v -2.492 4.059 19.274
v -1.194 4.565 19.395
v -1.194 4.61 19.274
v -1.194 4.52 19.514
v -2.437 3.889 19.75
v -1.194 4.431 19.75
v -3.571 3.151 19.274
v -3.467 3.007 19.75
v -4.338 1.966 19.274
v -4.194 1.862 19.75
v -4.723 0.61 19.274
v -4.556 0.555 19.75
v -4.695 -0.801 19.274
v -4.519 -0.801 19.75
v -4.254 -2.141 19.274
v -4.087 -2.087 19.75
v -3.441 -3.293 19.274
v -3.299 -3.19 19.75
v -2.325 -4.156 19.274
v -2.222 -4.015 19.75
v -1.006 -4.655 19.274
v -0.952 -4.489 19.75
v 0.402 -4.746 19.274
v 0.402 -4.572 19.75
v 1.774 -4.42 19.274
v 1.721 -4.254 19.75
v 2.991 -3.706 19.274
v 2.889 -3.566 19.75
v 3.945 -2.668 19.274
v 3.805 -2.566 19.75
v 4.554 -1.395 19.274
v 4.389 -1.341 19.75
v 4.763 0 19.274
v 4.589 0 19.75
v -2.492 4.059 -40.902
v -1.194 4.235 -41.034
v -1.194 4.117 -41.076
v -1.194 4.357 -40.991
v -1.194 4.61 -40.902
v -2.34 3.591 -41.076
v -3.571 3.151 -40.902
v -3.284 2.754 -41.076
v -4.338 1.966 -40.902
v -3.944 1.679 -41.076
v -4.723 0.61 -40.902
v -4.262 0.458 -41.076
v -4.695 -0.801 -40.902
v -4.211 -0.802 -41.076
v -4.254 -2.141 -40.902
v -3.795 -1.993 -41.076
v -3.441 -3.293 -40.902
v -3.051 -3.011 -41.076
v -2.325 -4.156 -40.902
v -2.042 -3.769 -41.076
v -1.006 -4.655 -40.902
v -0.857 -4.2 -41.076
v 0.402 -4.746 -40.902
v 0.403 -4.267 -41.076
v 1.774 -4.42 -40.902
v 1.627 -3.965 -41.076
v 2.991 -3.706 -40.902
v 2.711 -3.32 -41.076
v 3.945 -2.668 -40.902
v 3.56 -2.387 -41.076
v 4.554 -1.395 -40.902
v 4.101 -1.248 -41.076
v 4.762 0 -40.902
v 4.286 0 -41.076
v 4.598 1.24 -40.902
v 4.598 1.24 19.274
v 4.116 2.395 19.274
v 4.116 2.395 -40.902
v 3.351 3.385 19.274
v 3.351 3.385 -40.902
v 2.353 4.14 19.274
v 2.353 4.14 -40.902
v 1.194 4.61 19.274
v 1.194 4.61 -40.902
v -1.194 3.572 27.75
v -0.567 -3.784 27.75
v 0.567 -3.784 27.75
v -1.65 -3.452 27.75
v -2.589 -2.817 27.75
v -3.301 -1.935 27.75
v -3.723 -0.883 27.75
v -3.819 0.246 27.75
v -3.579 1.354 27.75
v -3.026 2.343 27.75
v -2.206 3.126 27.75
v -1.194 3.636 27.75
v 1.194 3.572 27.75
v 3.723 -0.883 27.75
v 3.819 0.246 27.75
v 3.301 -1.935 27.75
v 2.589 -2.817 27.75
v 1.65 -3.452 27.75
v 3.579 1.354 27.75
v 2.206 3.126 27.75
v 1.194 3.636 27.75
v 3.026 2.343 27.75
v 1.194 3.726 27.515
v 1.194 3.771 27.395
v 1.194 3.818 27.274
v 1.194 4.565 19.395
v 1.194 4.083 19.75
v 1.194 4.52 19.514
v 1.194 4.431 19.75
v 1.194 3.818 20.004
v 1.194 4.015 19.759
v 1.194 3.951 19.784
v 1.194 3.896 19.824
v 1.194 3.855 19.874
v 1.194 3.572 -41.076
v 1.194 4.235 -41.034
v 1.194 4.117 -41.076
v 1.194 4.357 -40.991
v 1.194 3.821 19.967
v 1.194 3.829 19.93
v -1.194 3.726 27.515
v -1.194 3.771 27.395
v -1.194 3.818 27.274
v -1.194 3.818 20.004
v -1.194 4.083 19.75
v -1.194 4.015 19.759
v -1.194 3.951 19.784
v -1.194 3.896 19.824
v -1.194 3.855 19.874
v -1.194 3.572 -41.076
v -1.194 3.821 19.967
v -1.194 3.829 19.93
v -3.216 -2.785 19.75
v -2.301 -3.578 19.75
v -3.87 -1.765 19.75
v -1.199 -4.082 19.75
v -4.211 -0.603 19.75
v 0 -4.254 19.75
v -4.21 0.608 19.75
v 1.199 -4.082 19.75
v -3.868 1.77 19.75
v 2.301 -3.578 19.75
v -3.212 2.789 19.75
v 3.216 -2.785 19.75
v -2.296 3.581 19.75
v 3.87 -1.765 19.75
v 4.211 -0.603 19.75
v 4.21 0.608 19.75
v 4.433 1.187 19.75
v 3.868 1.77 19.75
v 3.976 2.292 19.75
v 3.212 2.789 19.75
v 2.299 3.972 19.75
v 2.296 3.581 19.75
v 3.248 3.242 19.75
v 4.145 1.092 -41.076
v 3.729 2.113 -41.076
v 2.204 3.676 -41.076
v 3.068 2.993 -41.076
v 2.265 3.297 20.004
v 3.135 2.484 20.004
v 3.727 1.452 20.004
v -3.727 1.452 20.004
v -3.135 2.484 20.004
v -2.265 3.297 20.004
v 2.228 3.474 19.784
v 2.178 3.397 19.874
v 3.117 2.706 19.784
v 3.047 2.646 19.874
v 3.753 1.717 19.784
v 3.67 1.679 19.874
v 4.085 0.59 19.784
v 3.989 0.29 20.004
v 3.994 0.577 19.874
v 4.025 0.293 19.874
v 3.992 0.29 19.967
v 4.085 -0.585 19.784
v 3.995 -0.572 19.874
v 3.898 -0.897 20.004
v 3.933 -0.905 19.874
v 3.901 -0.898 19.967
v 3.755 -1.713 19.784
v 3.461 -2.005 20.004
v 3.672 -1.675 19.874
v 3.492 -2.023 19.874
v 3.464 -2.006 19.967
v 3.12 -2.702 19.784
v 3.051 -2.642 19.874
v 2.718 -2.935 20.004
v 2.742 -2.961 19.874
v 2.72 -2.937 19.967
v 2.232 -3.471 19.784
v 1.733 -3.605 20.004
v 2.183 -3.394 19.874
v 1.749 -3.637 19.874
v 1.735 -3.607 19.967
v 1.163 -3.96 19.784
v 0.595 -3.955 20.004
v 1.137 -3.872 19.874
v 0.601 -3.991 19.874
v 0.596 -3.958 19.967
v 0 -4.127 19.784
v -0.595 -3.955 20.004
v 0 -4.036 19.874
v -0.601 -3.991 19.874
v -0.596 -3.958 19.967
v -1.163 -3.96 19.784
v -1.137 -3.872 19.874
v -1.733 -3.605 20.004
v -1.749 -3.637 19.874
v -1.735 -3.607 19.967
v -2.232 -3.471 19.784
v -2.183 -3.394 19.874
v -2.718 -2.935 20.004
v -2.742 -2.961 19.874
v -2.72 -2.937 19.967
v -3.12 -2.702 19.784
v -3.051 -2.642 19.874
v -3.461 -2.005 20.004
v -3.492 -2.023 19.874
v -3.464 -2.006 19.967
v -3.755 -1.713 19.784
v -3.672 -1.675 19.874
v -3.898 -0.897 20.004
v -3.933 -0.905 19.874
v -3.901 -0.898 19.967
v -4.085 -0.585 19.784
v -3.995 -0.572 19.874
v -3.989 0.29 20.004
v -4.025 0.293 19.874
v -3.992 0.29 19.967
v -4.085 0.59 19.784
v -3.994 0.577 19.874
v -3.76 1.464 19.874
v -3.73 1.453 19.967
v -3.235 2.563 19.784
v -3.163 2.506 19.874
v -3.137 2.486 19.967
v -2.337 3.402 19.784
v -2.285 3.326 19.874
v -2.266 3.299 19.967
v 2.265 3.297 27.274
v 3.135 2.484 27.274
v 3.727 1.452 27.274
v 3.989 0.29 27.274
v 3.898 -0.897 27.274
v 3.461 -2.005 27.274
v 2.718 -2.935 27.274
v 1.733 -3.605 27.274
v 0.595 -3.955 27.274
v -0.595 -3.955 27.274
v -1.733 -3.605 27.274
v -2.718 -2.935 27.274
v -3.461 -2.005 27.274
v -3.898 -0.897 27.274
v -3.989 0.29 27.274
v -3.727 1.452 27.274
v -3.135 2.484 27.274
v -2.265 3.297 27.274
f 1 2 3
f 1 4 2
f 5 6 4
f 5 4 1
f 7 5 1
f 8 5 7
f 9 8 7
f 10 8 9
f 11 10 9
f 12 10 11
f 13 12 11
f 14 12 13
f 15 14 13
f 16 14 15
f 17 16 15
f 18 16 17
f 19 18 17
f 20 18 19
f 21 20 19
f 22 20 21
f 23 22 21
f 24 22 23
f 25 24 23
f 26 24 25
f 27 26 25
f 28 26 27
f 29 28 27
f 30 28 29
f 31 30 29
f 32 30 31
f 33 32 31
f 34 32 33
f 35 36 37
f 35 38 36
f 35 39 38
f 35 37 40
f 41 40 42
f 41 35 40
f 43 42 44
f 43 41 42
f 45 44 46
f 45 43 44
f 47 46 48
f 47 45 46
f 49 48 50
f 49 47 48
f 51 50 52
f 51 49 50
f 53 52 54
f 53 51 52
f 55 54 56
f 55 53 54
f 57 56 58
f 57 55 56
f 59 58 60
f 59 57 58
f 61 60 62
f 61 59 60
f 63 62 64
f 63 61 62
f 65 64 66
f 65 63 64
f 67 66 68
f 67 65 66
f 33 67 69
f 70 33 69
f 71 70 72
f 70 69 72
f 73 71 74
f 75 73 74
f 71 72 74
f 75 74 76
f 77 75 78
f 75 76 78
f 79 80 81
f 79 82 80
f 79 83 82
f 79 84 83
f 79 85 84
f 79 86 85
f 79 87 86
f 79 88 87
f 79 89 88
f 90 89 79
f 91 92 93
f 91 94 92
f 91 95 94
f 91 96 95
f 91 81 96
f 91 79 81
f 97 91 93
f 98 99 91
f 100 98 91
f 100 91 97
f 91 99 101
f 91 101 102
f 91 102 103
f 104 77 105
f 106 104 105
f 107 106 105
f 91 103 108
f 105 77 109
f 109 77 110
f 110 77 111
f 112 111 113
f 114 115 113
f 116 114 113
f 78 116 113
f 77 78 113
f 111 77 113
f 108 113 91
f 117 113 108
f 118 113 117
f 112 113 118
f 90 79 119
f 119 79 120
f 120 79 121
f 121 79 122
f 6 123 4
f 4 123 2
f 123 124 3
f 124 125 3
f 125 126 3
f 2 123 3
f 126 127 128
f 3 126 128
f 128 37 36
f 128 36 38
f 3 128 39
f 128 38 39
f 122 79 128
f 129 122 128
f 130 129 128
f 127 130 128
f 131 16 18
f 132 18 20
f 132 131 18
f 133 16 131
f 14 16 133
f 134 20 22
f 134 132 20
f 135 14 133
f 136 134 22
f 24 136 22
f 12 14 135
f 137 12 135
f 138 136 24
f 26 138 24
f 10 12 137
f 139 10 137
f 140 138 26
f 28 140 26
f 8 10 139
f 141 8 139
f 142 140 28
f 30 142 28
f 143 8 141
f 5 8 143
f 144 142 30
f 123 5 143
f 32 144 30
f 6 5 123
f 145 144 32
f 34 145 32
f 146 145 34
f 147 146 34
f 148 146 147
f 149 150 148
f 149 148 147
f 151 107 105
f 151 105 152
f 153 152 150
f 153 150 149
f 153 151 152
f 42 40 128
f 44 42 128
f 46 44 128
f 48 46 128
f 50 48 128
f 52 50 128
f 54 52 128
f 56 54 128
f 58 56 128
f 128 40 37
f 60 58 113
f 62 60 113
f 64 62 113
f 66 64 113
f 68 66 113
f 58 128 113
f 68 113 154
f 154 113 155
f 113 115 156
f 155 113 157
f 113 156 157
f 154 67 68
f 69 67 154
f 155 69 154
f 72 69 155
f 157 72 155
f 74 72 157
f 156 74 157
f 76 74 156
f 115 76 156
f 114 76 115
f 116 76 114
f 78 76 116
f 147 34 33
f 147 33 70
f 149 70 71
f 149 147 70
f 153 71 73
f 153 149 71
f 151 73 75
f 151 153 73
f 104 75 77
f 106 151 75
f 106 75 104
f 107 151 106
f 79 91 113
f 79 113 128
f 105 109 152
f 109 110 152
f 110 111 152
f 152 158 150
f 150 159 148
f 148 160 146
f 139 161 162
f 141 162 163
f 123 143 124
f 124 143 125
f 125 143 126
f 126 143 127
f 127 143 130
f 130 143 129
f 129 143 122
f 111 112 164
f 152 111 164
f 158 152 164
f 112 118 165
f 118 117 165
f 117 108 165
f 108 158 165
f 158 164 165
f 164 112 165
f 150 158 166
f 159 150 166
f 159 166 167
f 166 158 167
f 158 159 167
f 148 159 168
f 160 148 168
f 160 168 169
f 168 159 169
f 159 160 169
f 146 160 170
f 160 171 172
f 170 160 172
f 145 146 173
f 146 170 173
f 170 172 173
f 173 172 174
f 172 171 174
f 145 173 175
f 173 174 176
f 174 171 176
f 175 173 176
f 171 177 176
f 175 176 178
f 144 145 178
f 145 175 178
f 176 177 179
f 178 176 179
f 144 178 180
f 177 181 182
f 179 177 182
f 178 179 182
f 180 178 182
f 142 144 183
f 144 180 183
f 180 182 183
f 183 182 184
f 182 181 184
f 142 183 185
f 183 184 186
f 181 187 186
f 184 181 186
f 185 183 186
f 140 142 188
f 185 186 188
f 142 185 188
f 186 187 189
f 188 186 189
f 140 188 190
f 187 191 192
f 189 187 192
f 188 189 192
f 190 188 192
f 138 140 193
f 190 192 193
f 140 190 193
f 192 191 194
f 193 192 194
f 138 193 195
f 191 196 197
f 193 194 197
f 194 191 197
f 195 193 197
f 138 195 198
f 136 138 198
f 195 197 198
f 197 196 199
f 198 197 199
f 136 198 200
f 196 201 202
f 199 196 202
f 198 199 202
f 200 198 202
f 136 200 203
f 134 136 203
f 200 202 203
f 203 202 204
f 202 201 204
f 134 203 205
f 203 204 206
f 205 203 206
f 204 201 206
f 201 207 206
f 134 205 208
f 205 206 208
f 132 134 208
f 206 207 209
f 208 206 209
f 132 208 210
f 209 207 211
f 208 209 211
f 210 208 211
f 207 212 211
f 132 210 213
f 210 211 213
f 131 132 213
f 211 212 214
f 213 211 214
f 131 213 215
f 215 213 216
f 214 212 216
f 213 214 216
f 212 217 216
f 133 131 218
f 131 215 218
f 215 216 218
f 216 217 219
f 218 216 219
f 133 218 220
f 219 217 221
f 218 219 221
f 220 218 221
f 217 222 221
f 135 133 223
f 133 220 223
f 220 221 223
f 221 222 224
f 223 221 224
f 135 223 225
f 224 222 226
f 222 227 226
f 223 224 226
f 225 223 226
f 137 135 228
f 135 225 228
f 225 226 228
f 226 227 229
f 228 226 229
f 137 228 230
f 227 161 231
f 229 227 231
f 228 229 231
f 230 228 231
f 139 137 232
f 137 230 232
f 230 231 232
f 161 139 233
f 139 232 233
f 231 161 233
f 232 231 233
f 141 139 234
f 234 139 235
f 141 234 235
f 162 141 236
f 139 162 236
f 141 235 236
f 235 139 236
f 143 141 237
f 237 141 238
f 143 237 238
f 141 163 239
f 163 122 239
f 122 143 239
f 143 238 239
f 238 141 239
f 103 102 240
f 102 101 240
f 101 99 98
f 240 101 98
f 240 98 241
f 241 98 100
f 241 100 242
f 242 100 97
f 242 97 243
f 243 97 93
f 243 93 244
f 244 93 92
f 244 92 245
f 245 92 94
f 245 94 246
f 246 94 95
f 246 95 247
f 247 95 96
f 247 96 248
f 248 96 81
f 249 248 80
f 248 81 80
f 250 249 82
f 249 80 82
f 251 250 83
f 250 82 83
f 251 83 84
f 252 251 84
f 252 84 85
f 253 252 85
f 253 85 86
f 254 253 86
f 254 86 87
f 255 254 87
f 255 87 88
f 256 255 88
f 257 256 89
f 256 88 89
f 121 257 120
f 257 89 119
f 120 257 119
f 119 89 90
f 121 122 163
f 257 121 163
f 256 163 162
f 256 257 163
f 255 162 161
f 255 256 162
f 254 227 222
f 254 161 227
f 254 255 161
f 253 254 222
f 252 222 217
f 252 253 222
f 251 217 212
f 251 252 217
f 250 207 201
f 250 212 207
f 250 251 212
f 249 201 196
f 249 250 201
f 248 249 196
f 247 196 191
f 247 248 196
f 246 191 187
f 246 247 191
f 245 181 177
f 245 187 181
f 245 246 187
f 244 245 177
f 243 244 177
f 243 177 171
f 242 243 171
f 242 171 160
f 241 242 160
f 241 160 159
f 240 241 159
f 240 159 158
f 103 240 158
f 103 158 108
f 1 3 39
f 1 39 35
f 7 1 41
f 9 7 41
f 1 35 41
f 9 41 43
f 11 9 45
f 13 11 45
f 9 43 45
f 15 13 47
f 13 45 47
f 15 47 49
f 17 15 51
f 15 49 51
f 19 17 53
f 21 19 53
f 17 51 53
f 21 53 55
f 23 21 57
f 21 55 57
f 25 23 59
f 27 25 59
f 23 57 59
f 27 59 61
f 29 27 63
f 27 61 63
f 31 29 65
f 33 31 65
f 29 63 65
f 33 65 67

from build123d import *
from OCP.BRepFilletAPI import BRepFilletAPI_MakeChamfer

# Parameters (mm, degrees)
BOSS_EXTRUDE1_DEPTH      = 27.750000126
BOSS_EXTRUDE1_DEPTH_BACK = 41.075600094
SKETCH5_R                = 4.7625
SKETCH5_R_2              = 4
CUT_EXTRUDE1_DEPTH       = 8
CHAMFER1_SIZE            = 0.47625
CHAMFER1_SIZE2           = 0.173340824
FILLET1_R                = 0.254


with BuildPart() as part:
    # Sketch3 → Boss-Extrude1 (new, two sides: drawn at the far end of the back side and taken through both)
    with BuildSketch(Plane.XY.offset(-BOSS_EXTRUDE1_DEPTH_BACK)):
        with BuildLine():
            Line((-1.1938, 3.571875), (-1.1938, 4.610449849))
            ThreePointArc((-1.1938, 4.610449849), (-2.915127249, -3.766090728), (4.7625, 0))
            ThreePointArc((4.7625, 0), (3.766090728, 2.915127249), (1.1938, 4.610449849))
            Line((1.1938, 4.610449849), (1.1938, 3.571875))
            Line((1.1938, 3.571875), (-1.1938, 3.571875))
        make_face()
    extrude(amount=BOSS_EXTRUDE1_DEPTH + BOSS_EXTRUDE1_DEPTH_BACK)

    # Sketch5 → Cut-Extrude1 (cut)
    with BuildSketch(Plane.XY.offset(27.750000126)):
        Circle(SKETCH5_R)
        Circle(SKETCH5_R_2, mode=Mode.SUBTRACT)
    extrude(amount=-CUT_EXTRUDE1_DEPTH, mode=Mode.SUBTRACT)

    # Chamfer1: one chamfer whose edges measure the first distance from different faces: ONE call of the kernel's chamfer builder (chamfer() names one face for all edges)
    chamfer1_edges_1 = [part.edges().sort_by_distance(p)[0] for p in [
        (0, -4, 27.750000126),
    ]]
    chamfer1_side_1 = [part.faces().sort_by_distance(p)[0] for p in [
        (0, -4, 23.750000126),
    ]]
    chamfer1_edges_2 = [part.edges().sort_by_distance(p)[0] for p in [
        (-2.915127249, -3.766090728, 19.750000126),
    ]]
    chamfer1_side_2 = [part.faces().sort_by_distance(p)[0] for p in [
        (-2.915127249, -3.766090728, -10.662799984),
    ]]
    chamfer1_edges_3 = [part.edges().sort_by_distance(p)[0] for p in [
        (-2.915127249, -3.766090728, -41.075600094),
    ]]
    chamfer1_side_3 = [part.faces().sort_by_distance(p)[0] for p in [
        (0, -0.164578508, -41.075600094),
    ]]
    chamfer1 = BRepFilletAPI_MakeChamfer(part.part.solid().wrapped)
    for e in chamfer1_edges_1:
        chamfer1.Add(CHAMFER1_SIZE, CHAMFER1_SIZE2, e.wrapped, chamfer1_side_1[0].wrapped)  # the first distance lies on this face
    for e in chamfer1_edges_2:
        chamfer1.Add(CHAMFER1_SIZE, CHAMFER1_SIZE2, e.wrapped, chamfer1_side_2[0].wrapped)  # the first distance lies on this face
    for e in chamfer1_edges_3:
        chamfer1.Add(CHAMFER1_SIZE, CHAMFER1_SIZE2, e.wrapped, chamfer1_side_3[0].wrapped)  # the first distance lies on this face
    add(Compound.cast(chamfer1.Shape()), mode=Mode.REPLACE)

    # Fillet1
    fillet1_edges = [part.edges().sort_by_distance(p)[0] for p in [
        (0, -4, 19.750000126),
    ]]
    fillet(fillet1_edges, radius=FILLET1_R)


solid = part.part
